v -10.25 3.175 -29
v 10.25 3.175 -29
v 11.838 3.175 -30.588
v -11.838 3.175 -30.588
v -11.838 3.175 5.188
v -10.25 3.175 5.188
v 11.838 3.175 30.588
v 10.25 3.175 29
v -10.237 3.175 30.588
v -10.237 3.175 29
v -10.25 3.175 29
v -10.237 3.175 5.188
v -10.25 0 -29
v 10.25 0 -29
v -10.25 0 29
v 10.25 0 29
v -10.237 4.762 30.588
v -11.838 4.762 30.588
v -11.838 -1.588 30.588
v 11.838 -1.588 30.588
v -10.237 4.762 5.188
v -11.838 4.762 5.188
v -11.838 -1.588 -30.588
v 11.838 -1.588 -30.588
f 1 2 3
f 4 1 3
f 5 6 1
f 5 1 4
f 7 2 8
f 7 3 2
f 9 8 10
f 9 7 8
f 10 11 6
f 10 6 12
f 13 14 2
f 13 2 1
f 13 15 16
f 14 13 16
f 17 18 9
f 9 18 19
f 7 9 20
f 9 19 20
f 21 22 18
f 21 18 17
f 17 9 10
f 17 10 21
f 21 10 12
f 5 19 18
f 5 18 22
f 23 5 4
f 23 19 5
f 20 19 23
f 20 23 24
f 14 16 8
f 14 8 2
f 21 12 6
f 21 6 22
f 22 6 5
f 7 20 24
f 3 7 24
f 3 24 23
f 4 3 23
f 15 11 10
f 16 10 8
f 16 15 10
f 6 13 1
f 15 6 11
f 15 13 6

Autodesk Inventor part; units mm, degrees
ref_plane "YZ Plane" through (0, 0, 0) normal (1, 0, 0) x (0, 1, 0)
ref_plane "XZ Plane" through (0, 0, 0) normal (0, 1, 0) x (-1, 0, 0)
ref_plane "XY Plane" through (0, 0, 0) normal (0, 0, 1) x (1, 0, 0)
sketch "Sketch1" plane through (0, 0, 0) normal (0, 1, 0) x (-1, 0, 0)
  line L0 (10.25, 29) -> (-10.25, 29)
  line L1 (-10.25, 29) -> (-10.25, -29)
  line L2 (-10.25, -29) -> (10.25, -29)
  line L3 (10.25, -29) -> (10.25, 29)
  line L4 (11.8375, 30.5875) -> (-11.8375, 30.5875)
  line L5 (-11.8375, 30.5875) -> (-11.8375, -30.5875)
  line L6 (-11.8375, -30.5875) -> (11.8375, -30.5875)
  line L7 (11.8375, -30.5875) -> (11.8375, 30.5875)
  point P0 (0, 0)
  dimension "d0" = 20.5
  dimension "d1" = 1.5875
  dimension "d2" = 1.5875
  dimension "d3" = 1.5875
  dimension "d4" = 1.5875
  dimension "d5" = 58
  dimension "d6" = 29
  dimension "d7" = 10.25
extrude "Extrusion1" add sketch "Sketch1" along normal blind 3.175
sketch "Sketch2" plane through (0, 0, 0) normal (0, -1, 0) x (1, 0, 0)
  line L0 (-10.25, -29) -> (-10.25, 29) construction
  line L1 (-10.25, 29) -> (10.25, 29) construction
  line L2 (10.25, 29) -> (10.25, -29) construction
  line L3 (10.25, -29) -> (-10.25, -29) construction
  line L4 (-11.8375, 30.5875) -> (11.8375, 30.5875) projected
  line L5 (-11.8375, -30.5875) -> (-11.8375, 30.5875) projected
  line L6 (11.8375, -30.5875) -> (-11.8375, -30.5875) projected
  line L7 (11.8375, 30.5875) -> (11.8375, -30.5875) projected
  point P0 (0, 0)
extrude "Extrusion2" add sketch "Sketch2" along normal blind 1.5875
sketch "Sketch3" plane through (0, 3.175, 0) normal (0, 1, 0) x (1, 0, 0)
  line L0 (11.8375, 30.5875) -> (11.8375, -30.5875) projected
  line L1 (10.25, -29) -> (10.25, 29) projected
  line L2 (-11.8375, -30.5875) -> (-11.8375, 30.5875) projected
  line L3 (-11.8375, -30.5875) -> (-10.2373, -30.5875)
  line L4 (-10.2373, -30.5875) -> (-10.2373, -5.1875)
  line L5 (-10.2373, -5.1875) -> (-11.8375, -5.1875)
  line L6 (-11.8375, -5.1875) -> (-11.8375, -30.5875)
  point P0 (0, 0)
  dimension "d13" = 1.6002
  dimension "d14" = 25.4
extrude "Extrusion3" add sketch "Sketch3" along normal blind 1.5875
equation "\"d2\" = d1"
equation "\"d3\" = d2"
equation "\"d4\" = d3"
equation "\"d6\" = 0.5 * d5"
equation "\"d7\" = 0.5 * d0"
properties part number "Camera Platform" material "Aluminum 6061"
